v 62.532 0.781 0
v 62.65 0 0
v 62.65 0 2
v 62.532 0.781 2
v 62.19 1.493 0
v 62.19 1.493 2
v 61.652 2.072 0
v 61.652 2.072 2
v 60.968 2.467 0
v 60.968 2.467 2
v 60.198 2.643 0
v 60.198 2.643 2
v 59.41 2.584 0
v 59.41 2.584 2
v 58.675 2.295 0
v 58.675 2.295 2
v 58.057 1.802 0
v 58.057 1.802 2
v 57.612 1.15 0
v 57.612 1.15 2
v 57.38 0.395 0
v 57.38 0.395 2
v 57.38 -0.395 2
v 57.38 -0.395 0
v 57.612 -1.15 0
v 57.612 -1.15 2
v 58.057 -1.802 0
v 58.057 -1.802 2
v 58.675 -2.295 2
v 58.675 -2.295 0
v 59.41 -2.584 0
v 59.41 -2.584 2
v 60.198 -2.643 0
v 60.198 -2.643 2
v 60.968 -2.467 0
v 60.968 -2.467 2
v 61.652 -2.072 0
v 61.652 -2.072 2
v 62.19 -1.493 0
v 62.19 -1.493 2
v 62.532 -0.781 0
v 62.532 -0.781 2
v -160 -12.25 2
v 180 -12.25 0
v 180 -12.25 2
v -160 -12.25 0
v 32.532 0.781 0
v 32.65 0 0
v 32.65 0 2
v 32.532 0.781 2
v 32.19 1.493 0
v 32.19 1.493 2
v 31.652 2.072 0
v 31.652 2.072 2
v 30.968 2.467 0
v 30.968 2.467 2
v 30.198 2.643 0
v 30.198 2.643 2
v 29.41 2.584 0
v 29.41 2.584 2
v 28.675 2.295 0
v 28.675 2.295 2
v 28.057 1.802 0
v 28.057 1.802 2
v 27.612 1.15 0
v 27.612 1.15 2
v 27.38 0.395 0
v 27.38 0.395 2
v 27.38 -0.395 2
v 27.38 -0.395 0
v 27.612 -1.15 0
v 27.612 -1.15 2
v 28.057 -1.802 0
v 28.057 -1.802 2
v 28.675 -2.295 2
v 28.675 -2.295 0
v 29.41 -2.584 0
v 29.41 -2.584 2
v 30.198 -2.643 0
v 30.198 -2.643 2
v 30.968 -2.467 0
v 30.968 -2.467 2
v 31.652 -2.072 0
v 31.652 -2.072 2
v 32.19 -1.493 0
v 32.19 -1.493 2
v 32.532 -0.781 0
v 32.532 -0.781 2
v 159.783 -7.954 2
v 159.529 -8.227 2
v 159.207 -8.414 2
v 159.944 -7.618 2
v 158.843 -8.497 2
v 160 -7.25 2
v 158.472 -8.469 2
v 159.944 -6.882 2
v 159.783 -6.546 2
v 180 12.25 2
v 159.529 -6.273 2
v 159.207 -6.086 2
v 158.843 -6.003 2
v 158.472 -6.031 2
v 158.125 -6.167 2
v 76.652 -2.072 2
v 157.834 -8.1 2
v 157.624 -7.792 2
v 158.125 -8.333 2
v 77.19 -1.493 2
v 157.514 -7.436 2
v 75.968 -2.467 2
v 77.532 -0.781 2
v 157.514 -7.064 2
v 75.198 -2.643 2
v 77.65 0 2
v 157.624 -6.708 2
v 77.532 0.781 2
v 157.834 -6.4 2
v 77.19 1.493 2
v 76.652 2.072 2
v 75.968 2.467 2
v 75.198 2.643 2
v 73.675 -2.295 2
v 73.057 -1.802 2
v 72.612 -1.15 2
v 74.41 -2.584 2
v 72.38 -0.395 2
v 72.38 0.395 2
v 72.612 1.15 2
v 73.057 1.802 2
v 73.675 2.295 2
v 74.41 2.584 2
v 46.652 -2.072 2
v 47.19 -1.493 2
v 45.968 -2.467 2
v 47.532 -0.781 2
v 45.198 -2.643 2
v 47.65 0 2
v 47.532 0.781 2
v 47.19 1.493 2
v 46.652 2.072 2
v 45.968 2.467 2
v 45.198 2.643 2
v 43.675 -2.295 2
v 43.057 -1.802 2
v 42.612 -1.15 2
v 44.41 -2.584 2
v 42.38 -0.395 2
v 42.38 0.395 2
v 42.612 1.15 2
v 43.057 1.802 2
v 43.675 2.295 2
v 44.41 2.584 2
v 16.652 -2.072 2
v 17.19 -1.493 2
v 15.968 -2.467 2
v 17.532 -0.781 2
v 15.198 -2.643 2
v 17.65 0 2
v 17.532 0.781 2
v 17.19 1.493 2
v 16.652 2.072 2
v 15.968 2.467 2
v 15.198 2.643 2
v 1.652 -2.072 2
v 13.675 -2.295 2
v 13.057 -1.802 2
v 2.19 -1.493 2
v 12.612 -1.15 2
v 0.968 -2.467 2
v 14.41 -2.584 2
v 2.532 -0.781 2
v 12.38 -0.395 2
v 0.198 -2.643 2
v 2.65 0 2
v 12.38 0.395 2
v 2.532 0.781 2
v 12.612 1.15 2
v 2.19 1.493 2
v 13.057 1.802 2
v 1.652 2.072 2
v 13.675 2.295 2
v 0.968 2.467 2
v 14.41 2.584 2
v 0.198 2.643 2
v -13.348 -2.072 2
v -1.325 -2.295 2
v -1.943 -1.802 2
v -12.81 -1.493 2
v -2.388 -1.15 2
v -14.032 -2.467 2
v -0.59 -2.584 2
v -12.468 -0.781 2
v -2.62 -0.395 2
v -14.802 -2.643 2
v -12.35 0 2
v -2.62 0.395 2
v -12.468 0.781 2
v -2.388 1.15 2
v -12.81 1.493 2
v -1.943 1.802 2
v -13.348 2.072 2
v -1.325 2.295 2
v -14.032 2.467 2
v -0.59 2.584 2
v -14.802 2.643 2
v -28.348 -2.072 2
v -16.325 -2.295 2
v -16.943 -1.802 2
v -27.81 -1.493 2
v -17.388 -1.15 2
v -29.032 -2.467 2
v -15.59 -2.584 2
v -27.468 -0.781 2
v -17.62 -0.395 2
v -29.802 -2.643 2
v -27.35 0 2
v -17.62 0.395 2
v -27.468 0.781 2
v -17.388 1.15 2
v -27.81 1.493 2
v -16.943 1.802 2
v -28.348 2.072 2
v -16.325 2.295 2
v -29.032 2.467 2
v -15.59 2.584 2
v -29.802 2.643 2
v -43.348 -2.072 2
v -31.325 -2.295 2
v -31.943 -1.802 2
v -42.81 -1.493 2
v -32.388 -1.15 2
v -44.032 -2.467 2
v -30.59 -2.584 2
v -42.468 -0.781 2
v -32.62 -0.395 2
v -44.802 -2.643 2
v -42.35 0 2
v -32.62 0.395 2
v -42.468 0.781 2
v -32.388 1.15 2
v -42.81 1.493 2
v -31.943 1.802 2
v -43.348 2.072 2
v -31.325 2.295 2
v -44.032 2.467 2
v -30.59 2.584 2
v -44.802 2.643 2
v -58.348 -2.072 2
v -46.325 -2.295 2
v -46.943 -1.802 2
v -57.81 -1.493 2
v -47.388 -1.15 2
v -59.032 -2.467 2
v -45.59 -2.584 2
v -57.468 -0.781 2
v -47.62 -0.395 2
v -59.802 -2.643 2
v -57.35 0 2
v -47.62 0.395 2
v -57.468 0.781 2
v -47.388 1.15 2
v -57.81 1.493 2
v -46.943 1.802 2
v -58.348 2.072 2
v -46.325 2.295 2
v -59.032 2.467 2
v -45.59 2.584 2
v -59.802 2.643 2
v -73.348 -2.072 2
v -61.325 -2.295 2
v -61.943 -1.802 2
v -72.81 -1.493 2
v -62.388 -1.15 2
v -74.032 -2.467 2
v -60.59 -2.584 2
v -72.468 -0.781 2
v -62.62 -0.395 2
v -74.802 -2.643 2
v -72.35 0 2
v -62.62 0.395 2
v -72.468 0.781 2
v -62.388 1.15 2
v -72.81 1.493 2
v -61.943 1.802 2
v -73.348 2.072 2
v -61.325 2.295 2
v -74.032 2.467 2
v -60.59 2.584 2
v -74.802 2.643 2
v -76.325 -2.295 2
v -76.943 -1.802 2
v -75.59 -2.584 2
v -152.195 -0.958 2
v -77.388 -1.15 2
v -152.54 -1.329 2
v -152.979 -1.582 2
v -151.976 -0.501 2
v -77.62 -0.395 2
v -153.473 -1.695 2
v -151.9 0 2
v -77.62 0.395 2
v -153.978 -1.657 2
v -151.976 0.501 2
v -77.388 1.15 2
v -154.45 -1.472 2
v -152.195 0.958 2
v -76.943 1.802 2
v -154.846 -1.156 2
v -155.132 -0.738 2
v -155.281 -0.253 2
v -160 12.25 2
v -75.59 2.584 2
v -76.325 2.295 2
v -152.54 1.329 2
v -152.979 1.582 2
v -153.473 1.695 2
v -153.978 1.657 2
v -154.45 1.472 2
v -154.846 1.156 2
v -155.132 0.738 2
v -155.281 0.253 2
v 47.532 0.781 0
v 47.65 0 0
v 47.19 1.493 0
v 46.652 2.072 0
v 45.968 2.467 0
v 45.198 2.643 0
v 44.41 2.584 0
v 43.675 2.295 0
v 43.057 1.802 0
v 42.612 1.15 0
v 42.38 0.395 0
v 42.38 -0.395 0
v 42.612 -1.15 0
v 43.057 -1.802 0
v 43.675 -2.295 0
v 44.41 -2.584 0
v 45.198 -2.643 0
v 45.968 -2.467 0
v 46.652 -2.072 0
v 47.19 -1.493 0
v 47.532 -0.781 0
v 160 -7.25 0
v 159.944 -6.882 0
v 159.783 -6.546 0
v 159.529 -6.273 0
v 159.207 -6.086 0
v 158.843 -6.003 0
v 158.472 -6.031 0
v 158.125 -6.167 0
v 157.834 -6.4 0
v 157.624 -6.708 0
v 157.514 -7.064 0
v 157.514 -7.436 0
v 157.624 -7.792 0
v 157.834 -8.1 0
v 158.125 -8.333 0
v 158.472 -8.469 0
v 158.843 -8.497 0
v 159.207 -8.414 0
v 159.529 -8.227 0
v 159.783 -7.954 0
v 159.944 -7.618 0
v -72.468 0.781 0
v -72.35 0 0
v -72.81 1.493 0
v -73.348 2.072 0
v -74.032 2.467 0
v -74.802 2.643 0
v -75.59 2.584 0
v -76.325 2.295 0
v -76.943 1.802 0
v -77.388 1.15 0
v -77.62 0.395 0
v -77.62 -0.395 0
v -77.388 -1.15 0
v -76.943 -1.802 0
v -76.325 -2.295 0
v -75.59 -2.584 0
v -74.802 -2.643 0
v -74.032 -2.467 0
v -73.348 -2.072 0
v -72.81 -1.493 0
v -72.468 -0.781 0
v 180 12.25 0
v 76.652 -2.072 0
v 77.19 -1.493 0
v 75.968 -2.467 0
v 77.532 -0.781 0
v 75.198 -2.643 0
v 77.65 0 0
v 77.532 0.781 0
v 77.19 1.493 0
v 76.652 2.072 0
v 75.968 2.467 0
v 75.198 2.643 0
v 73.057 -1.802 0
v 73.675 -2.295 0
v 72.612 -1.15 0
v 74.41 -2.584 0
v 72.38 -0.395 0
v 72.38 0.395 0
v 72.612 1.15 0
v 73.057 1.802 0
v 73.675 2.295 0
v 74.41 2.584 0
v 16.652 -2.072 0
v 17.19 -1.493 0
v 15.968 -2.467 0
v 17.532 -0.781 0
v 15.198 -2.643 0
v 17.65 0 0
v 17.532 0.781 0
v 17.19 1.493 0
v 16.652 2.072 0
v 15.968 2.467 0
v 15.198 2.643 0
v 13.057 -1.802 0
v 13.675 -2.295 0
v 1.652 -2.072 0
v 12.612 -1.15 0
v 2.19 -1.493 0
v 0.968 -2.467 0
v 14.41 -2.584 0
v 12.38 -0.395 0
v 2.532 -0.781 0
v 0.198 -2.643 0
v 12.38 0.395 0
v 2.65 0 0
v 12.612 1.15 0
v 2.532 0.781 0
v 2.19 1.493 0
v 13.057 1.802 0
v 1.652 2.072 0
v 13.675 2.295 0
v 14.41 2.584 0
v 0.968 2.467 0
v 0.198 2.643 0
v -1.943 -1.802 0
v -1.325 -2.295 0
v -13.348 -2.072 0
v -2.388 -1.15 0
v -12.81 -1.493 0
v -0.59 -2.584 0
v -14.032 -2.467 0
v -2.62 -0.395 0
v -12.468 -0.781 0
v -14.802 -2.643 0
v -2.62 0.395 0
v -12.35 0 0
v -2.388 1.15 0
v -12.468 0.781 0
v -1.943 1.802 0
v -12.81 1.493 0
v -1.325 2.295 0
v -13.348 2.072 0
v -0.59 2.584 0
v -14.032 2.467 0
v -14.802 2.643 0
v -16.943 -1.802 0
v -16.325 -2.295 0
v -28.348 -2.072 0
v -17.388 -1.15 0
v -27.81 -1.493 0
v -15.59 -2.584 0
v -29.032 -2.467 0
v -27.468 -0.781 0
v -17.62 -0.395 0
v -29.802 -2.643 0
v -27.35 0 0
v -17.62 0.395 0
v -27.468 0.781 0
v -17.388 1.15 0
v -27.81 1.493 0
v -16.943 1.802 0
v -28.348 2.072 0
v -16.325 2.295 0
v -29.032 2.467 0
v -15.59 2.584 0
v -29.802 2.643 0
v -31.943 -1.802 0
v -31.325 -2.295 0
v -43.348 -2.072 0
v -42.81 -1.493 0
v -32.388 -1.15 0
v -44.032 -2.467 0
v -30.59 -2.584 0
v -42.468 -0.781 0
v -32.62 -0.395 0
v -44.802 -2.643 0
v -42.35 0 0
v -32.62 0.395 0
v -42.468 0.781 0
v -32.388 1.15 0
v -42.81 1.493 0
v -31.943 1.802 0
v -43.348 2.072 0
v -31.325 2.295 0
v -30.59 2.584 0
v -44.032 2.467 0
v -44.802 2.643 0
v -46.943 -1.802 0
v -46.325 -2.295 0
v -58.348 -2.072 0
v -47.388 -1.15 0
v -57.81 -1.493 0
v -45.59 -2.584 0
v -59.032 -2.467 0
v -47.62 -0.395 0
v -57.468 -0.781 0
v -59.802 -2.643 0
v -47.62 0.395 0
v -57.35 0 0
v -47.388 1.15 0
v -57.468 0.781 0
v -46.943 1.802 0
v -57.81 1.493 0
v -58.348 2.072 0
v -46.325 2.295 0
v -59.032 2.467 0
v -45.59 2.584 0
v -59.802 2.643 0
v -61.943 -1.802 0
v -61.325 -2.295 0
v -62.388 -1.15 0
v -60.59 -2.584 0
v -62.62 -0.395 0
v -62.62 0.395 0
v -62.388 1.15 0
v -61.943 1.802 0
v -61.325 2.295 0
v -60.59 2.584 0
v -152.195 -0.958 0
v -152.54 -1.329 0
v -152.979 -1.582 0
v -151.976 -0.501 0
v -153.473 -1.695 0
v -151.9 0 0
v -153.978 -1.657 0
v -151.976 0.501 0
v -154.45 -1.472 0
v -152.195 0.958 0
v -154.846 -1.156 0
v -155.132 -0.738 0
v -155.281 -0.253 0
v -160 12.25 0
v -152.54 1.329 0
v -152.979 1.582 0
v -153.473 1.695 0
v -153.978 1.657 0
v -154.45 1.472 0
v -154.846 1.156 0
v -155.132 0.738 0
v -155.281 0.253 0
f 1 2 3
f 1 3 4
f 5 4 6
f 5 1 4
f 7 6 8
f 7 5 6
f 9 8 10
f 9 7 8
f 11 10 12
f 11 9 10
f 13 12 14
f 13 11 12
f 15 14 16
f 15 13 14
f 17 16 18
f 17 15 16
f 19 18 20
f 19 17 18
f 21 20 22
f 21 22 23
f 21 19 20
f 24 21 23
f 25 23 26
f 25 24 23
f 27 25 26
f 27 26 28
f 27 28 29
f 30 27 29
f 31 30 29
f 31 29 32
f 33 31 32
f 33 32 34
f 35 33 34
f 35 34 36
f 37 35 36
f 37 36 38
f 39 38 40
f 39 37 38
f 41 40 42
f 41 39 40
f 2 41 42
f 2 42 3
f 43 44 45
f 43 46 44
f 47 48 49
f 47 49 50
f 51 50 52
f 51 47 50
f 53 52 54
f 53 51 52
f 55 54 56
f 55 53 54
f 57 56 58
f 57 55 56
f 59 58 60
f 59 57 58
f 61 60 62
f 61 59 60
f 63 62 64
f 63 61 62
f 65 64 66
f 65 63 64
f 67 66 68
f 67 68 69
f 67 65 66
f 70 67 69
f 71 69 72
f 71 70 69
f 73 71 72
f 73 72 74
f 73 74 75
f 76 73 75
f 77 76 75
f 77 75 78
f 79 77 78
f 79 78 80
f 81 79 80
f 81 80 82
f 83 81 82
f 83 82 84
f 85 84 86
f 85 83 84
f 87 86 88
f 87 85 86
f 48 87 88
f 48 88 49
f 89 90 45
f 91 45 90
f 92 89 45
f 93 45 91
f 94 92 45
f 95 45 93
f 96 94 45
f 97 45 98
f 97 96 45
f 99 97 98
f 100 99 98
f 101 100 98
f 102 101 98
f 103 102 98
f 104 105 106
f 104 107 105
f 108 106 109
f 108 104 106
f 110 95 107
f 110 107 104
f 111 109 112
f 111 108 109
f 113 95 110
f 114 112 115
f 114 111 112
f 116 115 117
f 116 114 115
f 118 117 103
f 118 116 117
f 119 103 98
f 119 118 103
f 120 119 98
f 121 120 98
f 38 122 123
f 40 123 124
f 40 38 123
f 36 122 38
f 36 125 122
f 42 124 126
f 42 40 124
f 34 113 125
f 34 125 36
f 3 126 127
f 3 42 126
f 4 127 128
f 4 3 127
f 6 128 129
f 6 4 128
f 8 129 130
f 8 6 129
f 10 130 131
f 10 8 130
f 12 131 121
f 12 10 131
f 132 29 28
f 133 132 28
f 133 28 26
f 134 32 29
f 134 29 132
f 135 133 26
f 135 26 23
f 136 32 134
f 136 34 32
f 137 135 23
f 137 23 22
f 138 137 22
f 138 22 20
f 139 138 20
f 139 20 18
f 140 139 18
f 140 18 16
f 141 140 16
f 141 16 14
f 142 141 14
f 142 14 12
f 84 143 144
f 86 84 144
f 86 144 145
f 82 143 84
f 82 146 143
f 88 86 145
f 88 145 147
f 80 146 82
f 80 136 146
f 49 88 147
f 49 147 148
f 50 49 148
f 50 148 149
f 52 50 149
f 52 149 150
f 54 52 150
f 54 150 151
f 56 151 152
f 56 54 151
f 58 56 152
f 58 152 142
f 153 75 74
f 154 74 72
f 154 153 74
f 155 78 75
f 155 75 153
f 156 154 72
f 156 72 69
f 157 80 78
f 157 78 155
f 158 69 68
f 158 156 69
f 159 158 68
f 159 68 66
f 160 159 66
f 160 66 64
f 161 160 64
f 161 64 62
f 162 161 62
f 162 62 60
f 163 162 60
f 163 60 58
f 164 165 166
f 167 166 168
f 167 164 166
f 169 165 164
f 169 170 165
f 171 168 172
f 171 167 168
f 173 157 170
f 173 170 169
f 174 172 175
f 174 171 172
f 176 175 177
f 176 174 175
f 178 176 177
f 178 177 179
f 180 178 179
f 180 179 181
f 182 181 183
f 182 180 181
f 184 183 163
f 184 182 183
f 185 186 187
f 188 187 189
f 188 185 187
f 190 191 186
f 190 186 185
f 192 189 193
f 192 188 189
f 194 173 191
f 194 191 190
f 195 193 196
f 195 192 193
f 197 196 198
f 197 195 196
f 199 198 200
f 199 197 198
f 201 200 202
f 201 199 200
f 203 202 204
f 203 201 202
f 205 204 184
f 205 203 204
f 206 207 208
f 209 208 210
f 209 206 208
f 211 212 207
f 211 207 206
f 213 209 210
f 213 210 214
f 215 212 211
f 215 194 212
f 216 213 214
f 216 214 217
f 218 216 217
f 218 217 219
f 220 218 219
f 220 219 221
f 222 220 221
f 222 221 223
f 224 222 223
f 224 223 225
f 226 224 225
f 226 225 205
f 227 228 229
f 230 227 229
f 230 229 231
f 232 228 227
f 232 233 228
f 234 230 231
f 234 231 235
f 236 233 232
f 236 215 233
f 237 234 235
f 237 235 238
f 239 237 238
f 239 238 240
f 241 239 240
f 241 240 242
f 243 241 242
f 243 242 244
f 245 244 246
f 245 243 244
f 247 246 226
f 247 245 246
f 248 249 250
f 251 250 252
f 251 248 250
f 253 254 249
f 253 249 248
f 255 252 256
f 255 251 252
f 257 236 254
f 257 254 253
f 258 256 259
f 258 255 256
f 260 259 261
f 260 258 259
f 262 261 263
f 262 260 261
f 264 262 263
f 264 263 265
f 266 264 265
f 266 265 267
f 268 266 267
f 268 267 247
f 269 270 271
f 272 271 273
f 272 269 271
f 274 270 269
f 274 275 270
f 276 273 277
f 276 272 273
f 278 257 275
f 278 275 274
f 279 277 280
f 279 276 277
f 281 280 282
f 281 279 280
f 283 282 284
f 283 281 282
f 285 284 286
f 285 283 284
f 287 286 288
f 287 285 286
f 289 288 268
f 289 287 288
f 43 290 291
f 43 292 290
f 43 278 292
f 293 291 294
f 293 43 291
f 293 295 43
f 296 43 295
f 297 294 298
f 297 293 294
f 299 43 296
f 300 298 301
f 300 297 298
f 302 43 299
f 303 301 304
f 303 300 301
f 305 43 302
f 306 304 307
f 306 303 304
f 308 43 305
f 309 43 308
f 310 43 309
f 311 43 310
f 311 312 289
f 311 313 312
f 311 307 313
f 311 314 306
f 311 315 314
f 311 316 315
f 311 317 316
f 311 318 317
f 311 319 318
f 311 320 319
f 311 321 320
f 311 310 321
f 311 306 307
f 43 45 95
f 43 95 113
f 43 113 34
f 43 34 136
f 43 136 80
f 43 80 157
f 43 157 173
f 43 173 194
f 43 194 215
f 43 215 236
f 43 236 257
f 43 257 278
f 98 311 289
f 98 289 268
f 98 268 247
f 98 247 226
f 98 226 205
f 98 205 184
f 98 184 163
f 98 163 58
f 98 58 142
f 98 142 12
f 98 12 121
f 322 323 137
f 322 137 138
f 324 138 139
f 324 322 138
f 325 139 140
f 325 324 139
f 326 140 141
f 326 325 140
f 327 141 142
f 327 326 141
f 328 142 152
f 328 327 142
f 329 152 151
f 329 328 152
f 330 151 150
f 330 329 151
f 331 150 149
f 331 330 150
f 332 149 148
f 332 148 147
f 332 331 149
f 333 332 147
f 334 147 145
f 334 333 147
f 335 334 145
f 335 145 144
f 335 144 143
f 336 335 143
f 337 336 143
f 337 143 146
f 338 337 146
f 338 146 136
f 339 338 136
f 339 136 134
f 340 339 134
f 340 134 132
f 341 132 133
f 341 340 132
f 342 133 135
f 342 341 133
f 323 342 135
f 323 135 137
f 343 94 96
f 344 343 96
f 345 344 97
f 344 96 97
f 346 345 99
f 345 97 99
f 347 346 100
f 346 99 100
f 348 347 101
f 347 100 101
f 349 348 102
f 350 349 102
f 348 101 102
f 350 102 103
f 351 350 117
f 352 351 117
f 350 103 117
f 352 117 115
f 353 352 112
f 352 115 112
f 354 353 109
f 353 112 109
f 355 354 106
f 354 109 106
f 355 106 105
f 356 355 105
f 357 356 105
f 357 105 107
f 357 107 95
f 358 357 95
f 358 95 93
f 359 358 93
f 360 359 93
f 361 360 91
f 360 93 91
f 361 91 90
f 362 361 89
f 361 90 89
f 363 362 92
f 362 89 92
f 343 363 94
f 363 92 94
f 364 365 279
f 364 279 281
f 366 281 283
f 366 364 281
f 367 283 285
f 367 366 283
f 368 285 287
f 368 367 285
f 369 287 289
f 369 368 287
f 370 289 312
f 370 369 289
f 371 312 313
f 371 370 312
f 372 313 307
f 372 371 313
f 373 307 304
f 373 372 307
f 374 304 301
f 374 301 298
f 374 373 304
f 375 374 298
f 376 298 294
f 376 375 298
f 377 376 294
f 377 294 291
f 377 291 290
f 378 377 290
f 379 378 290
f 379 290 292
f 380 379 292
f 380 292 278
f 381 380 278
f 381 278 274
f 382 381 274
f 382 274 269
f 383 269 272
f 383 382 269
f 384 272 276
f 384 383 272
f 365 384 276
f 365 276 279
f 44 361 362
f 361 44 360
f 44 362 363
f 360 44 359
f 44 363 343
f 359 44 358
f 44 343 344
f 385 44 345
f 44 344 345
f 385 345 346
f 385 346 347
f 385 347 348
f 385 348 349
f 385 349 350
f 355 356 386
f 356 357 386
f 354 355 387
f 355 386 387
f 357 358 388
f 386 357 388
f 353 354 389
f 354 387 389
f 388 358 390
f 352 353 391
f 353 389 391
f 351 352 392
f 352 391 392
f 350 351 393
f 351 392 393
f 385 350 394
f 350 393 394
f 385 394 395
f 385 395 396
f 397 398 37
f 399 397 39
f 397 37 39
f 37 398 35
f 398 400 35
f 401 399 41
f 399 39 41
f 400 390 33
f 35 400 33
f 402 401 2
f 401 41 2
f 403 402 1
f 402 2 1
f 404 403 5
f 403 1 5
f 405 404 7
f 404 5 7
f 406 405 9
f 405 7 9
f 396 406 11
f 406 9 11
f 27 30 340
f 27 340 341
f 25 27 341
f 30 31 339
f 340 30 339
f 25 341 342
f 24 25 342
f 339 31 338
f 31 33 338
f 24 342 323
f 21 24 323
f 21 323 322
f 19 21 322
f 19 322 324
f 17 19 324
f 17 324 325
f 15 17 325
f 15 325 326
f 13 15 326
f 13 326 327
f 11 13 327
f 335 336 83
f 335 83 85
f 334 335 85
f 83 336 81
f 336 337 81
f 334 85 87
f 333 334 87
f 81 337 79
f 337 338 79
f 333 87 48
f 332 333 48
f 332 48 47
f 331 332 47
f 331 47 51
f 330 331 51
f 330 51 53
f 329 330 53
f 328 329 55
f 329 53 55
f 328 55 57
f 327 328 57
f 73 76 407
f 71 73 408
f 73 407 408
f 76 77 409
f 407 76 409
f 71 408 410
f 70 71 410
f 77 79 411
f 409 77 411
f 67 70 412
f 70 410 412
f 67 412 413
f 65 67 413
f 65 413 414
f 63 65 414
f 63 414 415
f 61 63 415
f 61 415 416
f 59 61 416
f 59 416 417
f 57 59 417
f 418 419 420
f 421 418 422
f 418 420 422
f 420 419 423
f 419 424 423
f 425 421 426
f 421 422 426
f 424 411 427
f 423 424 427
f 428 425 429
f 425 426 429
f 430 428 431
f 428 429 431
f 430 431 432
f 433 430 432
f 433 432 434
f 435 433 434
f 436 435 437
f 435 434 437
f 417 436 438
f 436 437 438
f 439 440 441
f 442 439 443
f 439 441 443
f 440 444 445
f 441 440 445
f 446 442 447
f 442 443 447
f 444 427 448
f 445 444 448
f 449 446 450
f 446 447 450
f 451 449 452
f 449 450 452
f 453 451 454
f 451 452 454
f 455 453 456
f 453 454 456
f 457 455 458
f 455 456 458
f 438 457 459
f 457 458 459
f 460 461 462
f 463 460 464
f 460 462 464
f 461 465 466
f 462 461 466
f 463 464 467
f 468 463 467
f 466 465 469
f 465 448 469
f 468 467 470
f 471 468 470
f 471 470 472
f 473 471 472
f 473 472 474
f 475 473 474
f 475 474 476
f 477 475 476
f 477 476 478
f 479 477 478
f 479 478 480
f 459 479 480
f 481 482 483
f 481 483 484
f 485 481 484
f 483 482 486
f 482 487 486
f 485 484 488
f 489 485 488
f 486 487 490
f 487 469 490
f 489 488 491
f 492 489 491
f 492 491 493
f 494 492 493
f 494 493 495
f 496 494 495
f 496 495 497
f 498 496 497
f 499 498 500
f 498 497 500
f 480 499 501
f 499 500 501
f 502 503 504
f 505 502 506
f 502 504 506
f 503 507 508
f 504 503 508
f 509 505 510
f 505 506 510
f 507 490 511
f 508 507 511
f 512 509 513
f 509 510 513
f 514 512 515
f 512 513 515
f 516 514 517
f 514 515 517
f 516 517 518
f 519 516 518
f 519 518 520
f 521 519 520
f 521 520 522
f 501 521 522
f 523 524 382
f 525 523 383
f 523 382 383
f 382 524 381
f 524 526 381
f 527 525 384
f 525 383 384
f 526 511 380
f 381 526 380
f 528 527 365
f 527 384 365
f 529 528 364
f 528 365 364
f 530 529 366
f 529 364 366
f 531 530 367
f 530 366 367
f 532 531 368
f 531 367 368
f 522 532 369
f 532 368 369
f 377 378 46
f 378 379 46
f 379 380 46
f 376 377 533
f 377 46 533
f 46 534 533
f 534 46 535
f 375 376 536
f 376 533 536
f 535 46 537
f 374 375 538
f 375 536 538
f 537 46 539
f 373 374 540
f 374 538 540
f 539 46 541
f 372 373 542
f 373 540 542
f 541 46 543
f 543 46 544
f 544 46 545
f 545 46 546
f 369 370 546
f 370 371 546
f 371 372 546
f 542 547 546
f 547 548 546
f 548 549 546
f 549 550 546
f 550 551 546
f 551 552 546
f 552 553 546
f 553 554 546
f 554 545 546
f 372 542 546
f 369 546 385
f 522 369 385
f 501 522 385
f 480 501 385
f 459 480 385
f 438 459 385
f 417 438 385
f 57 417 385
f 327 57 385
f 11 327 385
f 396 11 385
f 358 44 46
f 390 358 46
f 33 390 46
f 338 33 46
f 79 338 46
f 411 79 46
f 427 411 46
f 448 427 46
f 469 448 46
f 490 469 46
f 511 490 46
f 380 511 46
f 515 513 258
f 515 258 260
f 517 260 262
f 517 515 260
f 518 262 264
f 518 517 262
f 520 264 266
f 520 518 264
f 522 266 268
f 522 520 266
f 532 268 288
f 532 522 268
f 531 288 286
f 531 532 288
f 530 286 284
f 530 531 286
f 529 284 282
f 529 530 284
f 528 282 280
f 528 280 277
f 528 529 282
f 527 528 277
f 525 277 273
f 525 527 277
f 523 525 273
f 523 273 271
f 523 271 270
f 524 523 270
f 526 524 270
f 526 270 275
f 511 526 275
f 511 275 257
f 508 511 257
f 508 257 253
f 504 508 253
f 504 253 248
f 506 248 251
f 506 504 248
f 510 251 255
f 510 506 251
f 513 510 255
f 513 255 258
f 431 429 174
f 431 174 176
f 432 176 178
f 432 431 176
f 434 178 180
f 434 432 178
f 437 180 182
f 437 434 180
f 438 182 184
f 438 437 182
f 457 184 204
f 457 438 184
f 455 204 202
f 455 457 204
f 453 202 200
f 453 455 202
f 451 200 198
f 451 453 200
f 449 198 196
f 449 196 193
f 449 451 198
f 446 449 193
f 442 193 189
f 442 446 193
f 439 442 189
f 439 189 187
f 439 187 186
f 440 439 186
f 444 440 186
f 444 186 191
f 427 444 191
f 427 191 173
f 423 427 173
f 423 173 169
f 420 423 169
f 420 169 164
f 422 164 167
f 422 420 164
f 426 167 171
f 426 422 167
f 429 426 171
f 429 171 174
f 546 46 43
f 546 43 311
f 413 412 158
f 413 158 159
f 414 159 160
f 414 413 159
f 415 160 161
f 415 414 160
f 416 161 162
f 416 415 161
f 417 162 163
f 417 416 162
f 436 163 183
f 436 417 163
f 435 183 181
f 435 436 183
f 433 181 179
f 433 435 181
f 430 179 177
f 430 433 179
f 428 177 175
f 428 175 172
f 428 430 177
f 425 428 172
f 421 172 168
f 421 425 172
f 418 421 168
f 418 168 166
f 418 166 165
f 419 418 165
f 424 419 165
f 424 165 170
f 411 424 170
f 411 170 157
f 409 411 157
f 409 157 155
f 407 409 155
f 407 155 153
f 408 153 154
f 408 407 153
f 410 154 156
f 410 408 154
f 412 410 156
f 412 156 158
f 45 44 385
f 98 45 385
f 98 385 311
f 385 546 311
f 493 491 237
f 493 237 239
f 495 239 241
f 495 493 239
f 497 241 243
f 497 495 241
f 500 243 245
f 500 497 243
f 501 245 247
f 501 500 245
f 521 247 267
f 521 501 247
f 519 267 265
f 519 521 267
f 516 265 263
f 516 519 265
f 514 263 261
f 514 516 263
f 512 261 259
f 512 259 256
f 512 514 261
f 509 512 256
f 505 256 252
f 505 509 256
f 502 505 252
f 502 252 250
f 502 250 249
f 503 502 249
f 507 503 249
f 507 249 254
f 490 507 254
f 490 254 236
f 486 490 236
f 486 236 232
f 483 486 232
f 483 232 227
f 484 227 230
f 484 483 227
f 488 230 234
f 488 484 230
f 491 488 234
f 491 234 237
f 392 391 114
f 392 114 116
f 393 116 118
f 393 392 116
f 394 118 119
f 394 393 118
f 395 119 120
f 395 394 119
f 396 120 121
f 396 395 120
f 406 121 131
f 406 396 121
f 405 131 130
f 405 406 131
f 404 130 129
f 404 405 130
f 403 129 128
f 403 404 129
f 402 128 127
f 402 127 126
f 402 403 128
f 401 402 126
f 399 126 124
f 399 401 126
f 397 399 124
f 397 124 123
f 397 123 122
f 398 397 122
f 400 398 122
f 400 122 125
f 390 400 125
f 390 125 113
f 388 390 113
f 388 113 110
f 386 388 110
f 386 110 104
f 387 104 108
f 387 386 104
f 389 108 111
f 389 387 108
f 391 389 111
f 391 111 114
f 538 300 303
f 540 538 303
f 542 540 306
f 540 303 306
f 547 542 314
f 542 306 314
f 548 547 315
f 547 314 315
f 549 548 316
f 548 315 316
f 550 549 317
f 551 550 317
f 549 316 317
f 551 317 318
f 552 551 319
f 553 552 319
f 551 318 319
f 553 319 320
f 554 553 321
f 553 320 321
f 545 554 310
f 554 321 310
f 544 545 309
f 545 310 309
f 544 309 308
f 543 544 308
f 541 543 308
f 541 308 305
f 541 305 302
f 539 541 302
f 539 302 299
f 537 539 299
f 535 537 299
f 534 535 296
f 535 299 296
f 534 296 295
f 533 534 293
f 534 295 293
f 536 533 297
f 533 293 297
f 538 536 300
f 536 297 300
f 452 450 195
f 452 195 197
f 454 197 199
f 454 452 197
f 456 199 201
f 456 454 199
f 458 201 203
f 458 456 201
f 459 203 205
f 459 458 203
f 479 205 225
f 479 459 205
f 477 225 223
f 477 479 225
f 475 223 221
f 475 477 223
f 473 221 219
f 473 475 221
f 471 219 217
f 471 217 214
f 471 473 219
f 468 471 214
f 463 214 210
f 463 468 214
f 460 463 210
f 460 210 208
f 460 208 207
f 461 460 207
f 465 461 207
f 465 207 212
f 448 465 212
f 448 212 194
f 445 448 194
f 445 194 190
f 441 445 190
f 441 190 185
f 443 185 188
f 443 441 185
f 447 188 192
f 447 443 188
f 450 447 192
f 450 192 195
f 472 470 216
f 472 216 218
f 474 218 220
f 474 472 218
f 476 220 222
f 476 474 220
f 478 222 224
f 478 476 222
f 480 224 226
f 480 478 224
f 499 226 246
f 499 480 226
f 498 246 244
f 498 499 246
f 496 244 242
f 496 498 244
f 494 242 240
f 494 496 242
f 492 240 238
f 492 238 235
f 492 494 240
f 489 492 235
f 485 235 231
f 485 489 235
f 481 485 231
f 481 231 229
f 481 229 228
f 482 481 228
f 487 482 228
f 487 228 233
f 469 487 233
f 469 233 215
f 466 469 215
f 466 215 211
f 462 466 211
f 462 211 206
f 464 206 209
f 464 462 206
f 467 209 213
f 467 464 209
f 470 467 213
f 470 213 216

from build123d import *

# Parameters (mm, degrees)
F0_W     = 300
F0_H     = 24.5
F0_R     = 2.65
F1_DEPTH = 2
F2_DEPTH = 10
F3_DEPTH = 30
F4_R     = 1.7
F5_DEPTH = 2
F6_R     = 1.25
F7_DEPTH = 2


with BuildPart() as f1:
    # F0 (on Top) → F1 (new body)
    with BuildSketch(Plane.XY):
        Rectangle(F0_W, F0_H)
        with Locations((-75, 0)):
            Circle(F0_R, mode=Mode.SUBTRACT)
        with Locations((-60, 0)):
            Circle(F0_R, mode=Mode.SUBTRACT)
        with Locations((-45, 0)):
            Circle(F0_R, mode=Mode.SUBTRACT)
        with Locations((-30, 0)):
            Circle(F0_R, mode=Mode.SUBTRACT)
        with Locations((-15, 0)):
            Circle(F0_R, mode=Mode.SUBTRACT)
        Circle(F0_R, mode=Mode.SUBTRACT)
        with Locations((15, 0)):
            Circle(F0_R, mode=Mode.SUBTRACT)
        with Locations((30, 0)):
            Circle(F0_R, mode=Mode.SUBTRACT)
        with Locations((45, 0)):
            Circle(F0_R, mode=Mode.SUBTRACT)
        with Locations((60, 0)):
            Circle(F0_R, mode=Mode.SUBTRACT)
        with Locations((75, 0)):
            Circle(F0_R, mode=Mode.SUBTRACT)
    extrude(amount=F1_DEPTH)

    # F2 (add): a face of the model
    f2_faces = [f1.faces().sort_by_distance(p)[0] for p in [
        (-150, 0, 1),
    ]]
    extrude(f2_faces, amount=F2_DEPTH)

    # F3 (add): a face of the model
    f3_faces = [f1.faces().sort_by_distance(p)[0] for p in [
        (150, 0, 1),
    ]]
    extrude(f3_faces, amount=F3_DEPTH)

    # F4 (on face) → F5 (cut, through all)
    with BuildSketch(Plane.XY.offset(2)):
        with Locations((-153.6, 0)):
            Circle(F4_R)
    extrude(amount=-F5_DEPTH, mode=Mode.SUBTRACT)

    # F6 (on face) → F7 (cut, through all)
    with BuildSketch(Plane.XY.offset(2)):
        with Locations((158.75, -7.25)):
            Circle(F6_R)
    extrude(amount=-F7_DEPTH, mode=Mode.SUBTRACT)


solid = f1.part
